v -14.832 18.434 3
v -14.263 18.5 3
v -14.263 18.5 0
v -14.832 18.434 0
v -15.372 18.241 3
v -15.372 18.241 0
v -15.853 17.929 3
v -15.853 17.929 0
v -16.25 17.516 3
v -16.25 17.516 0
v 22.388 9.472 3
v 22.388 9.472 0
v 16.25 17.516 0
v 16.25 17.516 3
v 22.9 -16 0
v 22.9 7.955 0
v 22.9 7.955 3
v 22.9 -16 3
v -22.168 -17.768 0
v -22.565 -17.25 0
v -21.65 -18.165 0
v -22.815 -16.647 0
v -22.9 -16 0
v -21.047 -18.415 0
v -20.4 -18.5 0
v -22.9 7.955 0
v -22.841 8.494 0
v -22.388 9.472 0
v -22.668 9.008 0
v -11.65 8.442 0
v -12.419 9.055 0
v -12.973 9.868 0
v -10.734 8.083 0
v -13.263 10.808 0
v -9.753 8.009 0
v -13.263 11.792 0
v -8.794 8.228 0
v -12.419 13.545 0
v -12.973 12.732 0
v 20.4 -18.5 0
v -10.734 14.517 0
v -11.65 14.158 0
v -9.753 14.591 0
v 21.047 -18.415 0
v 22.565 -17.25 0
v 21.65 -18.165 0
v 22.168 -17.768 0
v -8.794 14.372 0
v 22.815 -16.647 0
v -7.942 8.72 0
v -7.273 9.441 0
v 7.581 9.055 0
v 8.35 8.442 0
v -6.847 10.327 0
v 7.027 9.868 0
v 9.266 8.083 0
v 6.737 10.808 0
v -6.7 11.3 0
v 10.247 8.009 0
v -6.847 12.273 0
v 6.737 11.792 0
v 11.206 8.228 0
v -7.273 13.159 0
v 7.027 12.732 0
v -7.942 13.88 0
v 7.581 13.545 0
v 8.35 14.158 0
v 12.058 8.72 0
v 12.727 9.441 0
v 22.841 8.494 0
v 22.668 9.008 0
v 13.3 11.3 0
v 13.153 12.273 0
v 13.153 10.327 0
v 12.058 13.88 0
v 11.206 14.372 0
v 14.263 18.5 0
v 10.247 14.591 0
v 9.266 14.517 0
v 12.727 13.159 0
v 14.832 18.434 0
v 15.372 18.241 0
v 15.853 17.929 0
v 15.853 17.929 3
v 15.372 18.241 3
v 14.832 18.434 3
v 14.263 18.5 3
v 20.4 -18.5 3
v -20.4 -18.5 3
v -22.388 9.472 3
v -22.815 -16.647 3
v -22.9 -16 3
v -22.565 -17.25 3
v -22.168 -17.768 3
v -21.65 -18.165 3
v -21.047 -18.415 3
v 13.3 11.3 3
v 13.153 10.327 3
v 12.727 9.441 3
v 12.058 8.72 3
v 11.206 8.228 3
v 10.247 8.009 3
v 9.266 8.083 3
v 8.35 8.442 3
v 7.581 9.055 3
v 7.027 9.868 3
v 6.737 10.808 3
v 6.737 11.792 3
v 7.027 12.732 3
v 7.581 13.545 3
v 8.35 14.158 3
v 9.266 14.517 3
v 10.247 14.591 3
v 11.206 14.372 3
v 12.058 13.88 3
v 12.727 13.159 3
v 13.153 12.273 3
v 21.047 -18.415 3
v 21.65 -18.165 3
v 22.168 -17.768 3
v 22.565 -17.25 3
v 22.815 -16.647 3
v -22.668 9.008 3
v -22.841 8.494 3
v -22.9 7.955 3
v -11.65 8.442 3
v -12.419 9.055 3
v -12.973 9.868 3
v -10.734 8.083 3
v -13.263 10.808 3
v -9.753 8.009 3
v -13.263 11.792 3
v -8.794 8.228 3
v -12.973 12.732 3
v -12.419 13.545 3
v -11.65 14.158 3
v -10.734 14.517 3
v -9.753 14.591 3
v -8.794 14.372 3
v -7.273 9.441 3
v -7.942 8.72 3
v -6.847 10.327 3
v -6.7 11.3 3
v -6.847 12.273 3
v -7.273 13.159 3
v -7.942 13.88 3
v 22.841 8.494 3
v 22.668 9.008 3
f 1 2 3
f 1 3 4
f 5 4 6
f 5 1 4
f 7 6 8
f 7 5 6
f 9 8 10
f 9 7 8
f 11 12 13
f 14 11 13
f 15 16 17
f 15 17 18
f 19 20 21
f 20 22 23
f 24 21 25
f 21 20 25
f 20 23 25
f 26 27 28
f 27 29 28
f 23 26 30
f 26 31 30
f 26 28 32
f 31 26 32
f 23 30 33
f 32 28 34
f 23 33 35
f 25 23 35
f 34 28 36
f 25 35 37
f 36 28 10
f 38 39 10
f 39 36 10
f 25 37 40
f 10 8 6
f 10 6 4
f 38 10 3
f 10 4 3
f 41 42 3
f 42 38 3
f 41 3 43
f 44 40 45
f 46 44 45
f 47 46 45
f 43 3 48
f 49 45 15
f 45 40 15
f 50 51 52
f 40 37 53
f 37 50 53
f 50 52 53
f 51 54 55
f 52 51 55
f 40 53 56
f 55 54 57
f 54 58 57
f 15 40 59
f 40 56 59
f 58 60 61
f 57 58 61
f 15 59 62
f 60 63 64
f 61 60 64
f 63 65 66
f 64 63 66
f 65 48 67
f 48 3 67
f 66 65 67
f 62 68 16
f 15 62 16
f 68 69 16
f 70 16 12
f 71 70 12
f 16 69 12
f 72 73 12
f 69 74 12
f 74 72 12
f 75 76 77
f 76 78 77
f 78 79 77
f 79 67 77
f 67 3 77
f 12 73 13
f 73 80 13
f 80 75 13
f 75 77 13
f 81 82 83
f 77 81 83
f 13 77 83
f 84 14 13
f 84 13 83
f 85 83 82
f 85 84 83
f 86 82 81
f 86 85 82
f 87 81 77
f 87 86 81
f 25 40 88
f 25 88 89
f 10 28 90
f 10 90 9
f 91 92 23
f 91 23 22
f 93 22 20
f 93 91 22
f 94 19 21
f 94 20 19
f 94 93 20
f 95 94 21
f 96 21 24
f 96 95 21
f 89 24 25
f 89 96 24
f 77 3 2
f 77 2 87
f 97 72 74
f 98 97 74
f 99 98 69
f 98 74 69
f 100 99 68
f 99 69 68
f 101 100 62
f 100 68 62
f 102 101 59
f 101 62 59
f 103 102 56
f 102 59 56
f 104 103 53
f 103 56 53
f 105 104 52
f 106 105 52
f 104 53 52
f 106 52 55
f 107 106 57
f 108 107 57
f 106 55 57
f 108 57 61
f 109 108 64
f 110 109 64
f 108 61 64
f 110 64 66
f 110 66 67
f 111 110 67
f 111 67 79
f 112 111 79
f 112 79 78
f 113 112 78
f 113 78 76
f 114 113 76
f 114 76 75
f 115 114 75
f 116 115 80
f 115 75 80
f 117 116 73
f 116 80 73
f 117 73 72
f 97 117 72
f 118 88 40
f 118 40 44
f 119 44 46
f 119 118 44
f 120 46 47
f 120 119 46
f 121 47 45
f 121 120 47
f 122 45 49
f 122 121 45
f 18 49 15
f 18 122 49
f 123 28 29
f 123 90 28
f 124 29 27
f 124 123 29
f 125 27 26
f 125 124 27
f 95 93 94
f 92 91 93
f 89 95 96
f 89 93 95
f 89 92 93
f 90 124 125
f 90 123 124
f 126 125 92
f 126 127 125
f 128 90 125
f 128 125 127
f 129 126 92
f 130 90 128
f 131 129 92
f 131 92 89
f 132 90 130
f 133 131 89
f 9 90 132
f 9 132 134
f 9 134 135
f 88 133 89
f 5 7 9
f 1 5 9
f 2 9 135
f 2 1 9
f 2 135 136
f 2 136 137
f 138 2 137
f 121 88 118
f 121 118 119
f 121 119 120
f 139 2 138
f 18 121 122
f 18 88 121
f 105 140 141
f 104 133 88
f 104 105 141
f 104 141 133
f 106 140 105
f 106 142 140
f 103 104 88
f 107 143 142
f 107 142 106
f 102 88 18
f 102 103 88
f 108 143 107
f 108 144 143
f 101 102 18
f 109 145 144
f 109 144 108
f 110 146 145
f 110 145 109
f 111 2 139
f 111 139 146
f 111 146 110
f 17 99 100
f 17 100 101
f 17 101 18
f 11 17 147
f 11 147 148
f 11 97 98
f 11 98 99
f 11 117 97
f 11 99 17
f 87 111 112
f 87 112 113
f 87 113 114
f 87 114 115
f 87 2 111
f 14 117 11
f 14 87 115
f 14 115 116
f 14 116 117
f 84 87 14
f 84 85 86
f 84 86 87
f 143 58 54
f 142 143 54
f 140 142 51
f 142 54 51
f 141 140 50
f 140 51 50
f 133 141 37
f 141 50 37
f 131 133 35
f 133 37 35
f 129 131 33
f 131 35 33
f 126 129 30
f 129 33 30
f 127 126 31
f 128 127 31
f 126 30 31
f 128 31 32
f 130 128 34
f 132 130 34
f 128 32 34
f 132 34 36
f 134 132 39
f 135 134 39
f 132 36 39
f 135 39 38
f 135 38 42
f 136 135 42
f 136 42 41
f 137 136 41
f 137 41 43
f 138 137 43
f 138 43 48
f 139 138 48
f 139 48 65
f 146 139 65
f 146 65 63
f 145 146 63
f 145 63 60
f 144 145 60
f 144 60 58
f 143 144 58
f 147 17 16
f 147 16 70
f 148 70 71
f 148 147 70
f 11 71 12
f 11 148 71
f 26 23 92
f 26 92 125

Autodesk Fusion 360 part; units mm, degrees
sketch "Sketch1" plane through (0, 0, 0) normal (0, 0, 1) x (1, 0, 0)
  line L0 (22.9, -18.5) -> (-22.9, -18.5)
  line L1 (-22.9, -18.5) -> (-22.9, 8.8)
  line L2 (-15.5, 18.5) -> (15.5, 18.5)
  line L3 (22.9, 8.8) -> (22.9, -18.5)
  line L4 (22.9, -18.5) -> (-22.9, 18.5) construction
  line L5 (-22.9, -18.5) -> (22.9, 18.5) construction
  line L6 (0, 18.5) -> (0, -18.5)
  line L7 (10, 14.6) -> (10, 8)
  circle A0 centre (-10, 11.3) radius 3.3
  circle A1 centre (10, 11.3) radius 3.3
  line L8 (-22.9, 8.8) -> (-15.5, 18.5)
  line L9 (22.9, 8.8) -> (15.5, 18.5)
  line L10 (-13.9876, 11.3) -> (-13.3, 11.3)
  line L11 (13.3, 11.3) -> (13.9876, 11.3)
  line L12 (-10, 8.0786) -> (-10, 8)
  dimension "d1" = 45.8
  dimension "d2" = 37
  dimension "d5" = 6.6
  dimension "d6" = 27.3
extrude "Extrude1" add sketch "Sketch1" along normal blind 3
fillet "Fillet1" radius 2.5 6 edges at (15.5, 18.5, 1.5) (22.9, 8.8, 1.5) (22.9, -18.5, 1.5) (-22.9, -18.5, 1.5) (-22.9, 8.8, 1.5) (-15.5, 18.5, 1.5)
